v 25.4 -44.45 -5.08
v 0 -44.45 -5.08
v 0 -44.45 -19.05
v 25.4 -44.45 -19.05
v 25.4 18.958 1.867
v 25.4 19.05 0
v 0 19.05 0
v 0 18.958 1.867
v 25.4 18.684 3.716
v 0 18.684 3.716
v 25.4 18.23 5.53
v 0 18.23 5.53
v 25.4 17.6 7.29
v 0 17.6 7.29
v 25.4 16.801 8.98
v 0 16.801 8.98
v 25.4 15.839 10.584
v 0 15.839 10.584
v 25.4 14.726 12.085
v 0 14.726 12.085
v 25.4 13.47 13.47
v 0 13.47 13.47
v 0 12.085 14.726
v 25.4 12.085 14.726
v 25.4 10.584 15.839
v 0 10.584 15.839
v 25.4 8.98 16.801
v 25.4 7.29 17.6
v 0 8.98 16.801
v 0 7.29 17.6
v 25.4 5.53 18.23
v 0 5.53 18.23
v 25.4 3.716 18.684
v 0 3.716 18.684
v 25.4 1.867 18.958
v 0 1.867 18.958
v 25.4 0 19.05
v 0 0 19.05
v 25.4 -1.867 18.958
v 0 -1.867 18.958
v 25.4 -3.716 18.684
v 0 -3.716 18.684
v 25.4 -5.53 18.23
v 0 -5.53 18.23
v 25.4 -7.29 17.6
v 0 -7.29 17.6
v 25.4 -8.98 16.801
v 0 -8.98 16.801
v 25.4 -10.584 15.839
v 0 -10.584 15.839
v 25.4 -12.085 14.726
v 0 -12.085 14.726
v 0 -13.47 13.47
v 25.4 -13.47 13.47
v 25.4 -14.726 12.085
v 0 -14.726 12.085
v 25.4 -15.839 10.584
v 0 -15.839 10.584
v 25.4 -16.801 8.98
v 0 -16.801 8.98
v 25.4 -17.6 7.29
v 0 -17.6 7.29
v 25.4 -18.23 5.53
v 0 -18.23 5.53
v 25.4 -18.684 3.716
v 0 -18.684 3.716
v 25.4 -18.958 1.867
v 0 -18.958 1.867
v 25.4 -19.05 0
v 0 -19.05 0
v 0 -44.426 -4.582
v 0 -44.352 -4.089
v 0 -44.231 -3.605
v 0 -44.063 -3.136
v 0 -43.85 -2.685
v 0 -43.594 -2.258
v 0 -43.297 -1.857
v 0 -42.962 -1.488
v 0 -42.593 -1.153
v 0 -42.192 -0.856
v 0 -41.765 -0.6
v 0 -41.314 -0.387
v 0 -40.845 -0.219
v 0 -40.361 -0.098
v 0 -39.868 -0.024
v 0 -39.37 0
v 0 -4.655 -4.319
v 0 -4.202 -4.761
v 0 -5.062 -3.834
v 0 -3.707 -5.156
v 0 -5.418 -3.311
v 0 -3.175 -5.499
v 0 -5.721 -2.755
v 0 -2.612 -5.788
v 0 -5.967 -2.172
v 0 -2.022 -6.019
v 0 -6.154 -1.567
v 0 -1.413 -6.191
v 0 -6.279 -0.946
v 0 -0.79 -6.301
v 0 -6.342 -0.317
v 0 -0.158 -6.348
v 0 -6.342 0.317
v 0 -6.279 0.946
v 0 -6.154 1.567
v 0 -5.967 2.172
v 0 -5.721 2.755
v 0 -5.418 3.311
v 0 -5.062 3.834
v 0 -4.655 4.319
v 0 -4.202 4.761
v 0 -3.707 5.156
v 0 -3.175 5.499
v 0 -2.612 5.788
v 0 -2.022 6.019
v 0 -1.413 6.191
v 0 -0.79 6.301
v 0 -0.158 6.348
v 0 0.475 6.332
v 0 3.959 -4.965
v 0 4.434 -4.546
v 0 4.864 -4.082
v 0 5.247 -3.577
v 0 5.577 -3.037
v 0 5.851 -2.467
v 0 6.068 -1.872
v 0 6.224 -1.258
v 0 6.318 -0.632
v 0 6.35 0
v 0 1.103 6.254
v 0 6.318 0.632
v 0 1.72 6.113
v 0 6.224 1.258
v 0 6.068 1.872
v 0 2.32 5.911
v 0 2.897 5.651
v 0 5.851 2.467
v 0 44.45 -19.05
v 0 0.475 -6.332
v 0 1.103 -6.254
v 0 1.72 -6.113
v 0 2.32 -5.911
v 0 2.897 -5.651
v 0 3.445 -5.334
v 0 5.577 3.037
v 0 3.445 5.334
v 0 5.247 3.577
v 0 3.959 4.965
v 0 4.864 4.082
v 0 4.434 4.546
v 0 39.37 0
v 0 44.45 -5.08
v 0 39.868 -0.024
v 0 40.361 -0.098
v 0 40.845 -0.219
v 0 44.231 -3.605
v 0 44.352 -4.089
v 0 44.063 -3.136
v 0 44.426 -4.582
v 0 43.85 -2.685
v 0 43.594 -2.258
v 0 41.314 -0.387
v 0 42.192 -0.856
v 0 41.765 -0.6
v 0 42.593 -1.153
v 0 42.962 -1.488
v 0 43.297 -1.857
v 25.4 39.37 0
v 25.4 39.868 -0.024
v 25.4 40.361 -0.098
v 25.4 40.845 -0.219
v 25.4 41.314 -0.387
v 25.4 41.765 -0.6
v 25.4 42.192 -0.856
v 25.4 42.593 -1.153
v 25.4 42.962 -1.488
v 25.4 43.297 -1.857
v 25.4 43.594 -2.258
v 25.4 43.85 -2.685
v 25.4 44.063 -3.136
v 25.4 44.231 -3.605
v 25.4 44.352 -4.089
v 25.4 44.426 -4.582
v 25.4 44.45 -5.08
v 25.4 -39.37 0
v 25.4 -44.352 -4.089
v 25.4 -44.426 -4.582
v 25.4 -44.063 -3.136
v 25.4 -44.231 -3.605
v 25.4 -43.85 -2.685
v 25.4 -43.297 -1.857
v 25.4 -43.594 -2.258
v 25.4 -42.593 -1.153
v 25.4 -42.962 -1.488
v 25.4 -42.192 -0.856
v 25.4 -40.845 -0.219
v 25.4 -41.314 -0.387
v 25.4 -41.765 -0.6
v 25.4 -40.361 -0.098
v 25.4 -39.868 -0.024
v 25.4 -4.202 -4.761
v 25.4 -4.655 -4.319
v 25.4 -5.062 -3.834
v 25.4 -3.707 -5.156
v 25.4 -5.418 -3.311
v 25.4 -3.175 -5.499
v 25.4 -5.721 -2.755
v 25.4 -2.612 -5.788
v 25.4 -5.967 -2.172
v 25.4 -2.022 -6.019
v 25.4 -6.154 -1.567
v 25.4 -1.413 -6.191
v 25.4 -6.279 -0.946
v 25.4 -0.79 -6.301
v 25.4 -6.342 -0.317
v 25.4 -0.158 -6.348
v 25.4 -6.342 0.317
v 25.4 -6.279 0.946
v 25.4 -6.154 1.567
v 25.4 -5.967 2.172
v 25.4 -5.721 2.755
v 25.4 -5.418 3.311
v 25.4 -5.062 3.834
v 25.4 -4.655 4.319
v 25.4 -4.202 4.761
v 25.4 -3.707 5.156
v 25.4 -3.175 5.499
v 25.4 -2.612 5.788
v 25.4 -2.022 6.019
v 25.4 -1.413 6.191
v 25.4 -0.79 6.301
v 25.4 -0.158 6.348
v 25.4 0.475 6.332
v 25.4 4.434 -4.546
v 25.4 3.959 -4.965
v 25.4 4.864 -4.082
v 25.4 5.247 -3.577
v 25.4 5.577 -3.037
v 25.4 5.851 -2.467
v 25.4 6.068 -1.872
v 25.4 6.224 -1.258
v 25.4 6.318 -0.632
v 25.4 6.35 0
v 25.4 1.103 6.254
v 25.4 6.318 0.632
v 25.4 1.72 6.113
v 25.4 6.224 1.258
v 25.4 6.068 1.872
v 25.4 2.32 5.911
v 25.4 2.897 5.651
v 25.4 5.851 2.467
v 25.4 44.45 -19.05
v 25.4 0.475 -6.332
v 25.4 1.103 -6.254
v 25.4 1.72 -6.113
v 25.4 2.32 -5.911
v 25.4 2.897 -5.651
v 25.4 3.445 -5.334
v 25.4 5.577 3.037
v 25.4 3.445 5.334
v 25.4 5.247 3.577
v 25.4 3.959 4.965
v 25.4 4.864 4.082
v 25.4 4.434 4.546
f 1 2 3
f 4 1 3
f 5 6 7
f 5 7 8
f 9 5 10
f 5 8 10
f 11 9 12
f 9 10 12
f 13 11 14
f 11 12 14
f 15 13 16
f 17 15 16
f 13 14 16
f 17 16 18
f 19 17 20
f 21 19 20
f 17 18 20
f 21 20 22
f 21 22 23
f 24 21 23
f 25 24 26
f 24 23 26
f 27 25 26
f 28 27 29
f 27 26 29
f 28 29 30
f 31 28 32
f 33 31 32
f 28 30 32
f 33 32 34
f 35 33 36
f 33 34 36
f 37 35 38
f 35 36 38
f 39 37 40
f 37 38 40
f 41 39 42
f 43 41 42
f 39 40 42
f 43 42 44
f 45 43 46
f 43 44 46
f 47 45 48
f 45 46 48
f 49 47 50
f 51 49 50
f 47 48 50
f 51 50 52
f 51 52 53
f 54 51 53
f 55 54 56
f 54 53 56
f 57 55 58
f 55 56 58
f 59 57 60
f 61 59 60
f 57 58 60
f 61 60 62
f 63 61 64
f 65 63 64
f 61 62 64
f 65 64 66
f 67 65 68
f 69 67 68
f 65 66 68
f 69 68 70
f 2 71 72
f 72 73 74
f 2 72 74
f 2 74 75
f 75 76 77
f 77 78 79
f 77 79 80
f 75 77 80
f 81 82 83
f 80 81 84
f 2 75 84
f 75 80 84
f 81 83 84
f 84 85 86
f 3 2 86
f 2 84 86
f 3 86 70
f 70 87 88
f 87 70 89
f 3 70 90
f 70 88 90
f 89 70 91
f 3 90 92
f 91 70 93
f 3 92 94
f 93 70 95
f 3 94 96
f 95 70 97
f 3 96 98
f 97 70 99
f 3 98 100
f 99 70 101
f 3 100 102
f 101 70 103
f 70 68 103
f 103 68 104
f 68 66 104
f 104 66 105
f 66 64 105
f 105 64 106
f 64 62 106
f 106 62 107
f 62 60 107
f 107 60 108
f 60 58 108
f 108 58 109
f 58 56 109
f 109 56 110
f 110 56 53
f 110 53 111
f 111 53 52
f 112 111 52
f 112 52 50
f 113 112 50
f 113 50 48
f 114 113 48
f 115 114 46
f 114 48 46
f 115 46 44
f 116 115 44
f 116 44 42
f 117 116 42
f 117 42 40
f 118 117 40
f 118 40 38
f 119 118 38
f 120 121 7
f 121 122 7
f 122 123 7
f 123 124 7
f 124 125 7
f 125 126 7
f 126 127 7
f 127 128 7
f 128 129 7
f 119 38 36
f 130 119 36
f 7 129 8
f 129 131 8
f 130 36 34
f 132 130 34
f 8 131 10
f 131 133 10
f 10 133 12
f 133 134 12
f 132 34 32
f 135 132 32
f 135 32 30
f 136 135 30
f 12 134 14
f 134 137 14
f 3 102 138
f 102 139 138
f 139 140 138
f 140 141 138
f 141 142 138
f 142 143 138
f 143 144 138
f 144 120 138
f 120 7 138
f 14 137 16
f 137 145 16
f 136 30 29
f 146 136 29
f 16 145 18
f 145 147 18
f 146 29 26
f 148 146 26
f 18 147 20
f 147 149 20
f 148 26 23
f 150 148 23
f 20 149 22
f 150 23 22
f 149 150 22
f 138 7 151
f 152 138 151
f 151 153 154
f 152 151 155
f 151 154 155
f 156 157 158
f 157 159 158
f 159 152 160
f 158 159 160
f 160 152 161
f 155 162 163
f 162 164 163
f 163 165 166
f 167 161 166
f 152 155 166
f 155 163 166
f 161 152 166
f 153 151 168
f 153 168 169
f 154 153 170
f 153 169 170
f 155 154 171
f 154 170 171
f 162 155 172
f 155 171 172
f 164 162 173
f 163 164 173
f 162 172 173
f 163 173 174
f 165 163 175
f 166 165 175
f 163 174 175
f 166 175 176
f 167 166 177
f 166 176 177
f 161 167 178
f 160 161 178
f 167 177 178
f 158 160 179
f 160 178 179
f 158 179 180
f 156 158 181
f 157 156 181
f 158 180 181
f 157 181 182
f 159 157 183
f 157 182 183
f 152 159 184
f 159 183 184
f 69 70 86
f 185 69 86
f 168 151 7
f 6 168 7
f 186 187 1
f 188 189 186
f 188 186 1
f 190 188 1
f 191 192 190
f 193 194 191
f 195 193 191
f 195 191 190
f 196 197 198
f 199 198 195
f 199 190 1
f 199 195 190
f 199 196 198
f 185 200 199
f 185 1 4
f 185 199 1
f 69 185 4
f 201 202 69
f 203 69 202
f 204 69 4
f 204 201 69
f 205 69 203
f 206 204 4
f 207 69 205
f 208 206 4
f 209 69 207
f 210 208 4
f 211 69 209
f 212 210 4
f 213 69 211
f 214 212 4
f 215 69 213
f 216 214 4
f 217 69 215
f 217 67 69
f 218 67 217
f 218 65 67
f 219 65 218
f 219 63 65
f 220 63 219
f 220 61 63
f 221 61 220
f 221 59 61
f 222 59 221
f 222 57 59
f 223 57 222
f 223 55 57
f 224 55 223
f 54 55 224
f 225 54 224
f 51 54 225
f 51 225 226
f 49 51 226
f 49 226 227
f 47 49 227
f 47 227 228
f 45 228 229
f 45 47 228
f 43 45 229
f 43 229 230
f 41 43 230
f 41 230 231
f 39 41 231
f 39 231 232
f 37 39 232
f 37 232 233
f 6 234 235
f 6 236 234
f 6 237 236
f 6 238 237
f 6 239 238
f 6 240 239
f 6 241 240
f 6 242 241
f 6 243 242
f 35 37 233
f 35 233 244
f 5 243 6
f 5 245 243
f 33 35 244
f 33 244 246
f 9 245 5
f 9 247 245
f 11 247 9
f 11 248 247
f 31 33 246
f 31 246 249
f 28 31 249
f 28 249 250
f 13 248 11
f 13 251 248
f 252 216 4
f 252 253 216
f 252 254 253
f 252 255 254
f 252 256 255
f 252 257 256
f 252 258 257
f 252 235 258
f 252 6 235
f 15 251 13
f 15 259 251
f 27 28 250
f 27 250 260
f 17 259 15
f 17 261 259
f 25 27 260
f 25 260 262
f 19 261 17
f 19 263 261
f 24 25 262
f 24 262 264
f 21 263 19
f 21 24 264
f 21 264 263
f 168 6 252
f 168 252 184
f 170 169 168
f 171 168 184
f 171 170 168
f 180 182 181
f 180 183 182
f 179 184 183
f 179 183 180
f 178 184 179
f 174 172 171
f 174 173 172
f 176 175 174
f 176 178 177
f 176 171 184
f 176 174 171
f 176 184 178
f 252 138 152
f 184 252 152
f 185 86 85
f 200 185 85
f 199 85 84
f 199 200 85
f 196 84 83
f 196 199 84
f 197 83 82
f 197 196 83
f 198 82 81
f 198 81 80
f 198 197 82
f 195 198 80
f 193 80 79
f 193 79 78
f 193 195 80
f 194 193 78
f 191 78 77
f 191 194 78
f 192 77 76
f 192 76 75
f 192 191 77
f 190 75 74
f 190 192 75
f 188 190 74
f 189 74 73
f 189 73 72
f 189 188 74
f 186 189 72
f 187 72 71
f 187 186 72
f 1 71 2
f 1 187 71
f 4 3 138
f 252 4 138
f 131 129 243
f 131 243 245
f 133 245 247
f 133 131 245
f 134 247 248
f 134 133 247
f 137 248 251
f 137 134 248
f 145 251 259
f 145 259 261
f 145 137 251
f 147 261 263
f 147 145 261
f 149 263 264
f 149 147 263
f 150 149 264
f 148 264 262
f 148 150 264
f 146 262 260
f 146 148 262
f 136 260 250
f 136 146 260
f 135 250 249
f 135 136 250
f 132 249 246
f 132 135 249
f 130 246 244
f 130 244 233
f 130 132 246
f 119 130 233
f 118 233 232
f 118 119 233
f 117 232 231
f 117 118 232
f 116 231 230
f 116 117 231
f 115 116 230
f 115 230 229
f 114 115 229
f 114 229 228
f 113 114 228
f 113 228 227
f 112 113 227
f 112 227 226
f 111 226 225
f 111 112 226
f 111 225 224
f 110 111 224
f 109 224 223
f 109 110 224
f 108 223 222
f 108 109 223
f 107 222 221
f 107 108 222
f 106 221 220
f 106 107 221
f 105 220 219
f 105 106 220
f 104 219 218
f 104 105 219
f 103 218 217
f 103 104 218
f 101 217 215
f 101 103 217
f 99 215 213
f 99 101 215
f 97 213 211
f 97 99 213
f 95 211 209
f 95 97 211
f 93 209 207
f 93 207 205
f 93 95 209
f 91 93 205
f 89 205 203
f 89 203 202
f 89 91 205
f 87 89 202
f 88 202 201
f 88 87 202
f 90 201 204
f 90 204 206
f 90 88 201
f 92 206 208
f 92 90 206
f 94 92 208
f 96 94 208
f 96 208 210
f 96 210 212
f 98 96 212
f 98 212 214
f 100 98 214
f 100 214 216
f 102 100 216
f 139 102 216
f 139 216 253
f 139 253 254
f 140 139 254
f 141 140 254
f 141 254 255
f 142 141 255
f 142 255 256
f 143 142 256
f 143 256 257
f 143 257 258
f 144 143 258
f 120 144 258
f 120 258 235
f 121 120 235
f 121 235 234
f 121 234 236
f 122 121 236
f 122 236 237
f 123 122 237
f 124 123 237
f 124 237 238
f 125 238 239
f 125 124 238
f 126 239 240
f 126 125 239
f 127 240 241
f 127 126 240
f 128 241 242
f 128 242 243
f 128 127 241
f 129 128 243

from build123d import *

# Parameters (mm, degrees)
F0_R     = 6.35
F1_DEPTH = 25.4
F2_R     = 5.08
F3_R     = 5.08


with BuildPart() as f1:
    # F0 (on Right) → F1 (new body)
    with BuildSketch(Plane.YZ):
        with BuildLine():
            Line((44.45, 0), (19.05, 0))
            ThreePointArc((19.05, 0), (0, 19.05), (-19.05, 0))
            Line((-19.05, 0), (-44.45, 0))
            Line((-44.45, 0), (-44.45, -19.05))
            Line((-44.45, -19.05), (44.45, -19.05))
            Line((44.45, -19.05), (44.45, 0))
        make_face()
        Circle(F0_R, mode=Mode.SUBTRACT)
    extrude(amount=F1_DEPTH)

    # F2
    f2_edges = [f1.edges().sort_by_distance(p)[0] for p in [
        (12.7, 44.45, 0),
    ]]
    fillet(f2_edges, radius=F2_R)

    # F3
    f3_edges = [f1.edges().sort_by_distance(p)[0] for p in [
        (12.7, -44.45, 0),
    ]]
    fillet(f3_edges, radius=F3_R)


solid = f1.part
